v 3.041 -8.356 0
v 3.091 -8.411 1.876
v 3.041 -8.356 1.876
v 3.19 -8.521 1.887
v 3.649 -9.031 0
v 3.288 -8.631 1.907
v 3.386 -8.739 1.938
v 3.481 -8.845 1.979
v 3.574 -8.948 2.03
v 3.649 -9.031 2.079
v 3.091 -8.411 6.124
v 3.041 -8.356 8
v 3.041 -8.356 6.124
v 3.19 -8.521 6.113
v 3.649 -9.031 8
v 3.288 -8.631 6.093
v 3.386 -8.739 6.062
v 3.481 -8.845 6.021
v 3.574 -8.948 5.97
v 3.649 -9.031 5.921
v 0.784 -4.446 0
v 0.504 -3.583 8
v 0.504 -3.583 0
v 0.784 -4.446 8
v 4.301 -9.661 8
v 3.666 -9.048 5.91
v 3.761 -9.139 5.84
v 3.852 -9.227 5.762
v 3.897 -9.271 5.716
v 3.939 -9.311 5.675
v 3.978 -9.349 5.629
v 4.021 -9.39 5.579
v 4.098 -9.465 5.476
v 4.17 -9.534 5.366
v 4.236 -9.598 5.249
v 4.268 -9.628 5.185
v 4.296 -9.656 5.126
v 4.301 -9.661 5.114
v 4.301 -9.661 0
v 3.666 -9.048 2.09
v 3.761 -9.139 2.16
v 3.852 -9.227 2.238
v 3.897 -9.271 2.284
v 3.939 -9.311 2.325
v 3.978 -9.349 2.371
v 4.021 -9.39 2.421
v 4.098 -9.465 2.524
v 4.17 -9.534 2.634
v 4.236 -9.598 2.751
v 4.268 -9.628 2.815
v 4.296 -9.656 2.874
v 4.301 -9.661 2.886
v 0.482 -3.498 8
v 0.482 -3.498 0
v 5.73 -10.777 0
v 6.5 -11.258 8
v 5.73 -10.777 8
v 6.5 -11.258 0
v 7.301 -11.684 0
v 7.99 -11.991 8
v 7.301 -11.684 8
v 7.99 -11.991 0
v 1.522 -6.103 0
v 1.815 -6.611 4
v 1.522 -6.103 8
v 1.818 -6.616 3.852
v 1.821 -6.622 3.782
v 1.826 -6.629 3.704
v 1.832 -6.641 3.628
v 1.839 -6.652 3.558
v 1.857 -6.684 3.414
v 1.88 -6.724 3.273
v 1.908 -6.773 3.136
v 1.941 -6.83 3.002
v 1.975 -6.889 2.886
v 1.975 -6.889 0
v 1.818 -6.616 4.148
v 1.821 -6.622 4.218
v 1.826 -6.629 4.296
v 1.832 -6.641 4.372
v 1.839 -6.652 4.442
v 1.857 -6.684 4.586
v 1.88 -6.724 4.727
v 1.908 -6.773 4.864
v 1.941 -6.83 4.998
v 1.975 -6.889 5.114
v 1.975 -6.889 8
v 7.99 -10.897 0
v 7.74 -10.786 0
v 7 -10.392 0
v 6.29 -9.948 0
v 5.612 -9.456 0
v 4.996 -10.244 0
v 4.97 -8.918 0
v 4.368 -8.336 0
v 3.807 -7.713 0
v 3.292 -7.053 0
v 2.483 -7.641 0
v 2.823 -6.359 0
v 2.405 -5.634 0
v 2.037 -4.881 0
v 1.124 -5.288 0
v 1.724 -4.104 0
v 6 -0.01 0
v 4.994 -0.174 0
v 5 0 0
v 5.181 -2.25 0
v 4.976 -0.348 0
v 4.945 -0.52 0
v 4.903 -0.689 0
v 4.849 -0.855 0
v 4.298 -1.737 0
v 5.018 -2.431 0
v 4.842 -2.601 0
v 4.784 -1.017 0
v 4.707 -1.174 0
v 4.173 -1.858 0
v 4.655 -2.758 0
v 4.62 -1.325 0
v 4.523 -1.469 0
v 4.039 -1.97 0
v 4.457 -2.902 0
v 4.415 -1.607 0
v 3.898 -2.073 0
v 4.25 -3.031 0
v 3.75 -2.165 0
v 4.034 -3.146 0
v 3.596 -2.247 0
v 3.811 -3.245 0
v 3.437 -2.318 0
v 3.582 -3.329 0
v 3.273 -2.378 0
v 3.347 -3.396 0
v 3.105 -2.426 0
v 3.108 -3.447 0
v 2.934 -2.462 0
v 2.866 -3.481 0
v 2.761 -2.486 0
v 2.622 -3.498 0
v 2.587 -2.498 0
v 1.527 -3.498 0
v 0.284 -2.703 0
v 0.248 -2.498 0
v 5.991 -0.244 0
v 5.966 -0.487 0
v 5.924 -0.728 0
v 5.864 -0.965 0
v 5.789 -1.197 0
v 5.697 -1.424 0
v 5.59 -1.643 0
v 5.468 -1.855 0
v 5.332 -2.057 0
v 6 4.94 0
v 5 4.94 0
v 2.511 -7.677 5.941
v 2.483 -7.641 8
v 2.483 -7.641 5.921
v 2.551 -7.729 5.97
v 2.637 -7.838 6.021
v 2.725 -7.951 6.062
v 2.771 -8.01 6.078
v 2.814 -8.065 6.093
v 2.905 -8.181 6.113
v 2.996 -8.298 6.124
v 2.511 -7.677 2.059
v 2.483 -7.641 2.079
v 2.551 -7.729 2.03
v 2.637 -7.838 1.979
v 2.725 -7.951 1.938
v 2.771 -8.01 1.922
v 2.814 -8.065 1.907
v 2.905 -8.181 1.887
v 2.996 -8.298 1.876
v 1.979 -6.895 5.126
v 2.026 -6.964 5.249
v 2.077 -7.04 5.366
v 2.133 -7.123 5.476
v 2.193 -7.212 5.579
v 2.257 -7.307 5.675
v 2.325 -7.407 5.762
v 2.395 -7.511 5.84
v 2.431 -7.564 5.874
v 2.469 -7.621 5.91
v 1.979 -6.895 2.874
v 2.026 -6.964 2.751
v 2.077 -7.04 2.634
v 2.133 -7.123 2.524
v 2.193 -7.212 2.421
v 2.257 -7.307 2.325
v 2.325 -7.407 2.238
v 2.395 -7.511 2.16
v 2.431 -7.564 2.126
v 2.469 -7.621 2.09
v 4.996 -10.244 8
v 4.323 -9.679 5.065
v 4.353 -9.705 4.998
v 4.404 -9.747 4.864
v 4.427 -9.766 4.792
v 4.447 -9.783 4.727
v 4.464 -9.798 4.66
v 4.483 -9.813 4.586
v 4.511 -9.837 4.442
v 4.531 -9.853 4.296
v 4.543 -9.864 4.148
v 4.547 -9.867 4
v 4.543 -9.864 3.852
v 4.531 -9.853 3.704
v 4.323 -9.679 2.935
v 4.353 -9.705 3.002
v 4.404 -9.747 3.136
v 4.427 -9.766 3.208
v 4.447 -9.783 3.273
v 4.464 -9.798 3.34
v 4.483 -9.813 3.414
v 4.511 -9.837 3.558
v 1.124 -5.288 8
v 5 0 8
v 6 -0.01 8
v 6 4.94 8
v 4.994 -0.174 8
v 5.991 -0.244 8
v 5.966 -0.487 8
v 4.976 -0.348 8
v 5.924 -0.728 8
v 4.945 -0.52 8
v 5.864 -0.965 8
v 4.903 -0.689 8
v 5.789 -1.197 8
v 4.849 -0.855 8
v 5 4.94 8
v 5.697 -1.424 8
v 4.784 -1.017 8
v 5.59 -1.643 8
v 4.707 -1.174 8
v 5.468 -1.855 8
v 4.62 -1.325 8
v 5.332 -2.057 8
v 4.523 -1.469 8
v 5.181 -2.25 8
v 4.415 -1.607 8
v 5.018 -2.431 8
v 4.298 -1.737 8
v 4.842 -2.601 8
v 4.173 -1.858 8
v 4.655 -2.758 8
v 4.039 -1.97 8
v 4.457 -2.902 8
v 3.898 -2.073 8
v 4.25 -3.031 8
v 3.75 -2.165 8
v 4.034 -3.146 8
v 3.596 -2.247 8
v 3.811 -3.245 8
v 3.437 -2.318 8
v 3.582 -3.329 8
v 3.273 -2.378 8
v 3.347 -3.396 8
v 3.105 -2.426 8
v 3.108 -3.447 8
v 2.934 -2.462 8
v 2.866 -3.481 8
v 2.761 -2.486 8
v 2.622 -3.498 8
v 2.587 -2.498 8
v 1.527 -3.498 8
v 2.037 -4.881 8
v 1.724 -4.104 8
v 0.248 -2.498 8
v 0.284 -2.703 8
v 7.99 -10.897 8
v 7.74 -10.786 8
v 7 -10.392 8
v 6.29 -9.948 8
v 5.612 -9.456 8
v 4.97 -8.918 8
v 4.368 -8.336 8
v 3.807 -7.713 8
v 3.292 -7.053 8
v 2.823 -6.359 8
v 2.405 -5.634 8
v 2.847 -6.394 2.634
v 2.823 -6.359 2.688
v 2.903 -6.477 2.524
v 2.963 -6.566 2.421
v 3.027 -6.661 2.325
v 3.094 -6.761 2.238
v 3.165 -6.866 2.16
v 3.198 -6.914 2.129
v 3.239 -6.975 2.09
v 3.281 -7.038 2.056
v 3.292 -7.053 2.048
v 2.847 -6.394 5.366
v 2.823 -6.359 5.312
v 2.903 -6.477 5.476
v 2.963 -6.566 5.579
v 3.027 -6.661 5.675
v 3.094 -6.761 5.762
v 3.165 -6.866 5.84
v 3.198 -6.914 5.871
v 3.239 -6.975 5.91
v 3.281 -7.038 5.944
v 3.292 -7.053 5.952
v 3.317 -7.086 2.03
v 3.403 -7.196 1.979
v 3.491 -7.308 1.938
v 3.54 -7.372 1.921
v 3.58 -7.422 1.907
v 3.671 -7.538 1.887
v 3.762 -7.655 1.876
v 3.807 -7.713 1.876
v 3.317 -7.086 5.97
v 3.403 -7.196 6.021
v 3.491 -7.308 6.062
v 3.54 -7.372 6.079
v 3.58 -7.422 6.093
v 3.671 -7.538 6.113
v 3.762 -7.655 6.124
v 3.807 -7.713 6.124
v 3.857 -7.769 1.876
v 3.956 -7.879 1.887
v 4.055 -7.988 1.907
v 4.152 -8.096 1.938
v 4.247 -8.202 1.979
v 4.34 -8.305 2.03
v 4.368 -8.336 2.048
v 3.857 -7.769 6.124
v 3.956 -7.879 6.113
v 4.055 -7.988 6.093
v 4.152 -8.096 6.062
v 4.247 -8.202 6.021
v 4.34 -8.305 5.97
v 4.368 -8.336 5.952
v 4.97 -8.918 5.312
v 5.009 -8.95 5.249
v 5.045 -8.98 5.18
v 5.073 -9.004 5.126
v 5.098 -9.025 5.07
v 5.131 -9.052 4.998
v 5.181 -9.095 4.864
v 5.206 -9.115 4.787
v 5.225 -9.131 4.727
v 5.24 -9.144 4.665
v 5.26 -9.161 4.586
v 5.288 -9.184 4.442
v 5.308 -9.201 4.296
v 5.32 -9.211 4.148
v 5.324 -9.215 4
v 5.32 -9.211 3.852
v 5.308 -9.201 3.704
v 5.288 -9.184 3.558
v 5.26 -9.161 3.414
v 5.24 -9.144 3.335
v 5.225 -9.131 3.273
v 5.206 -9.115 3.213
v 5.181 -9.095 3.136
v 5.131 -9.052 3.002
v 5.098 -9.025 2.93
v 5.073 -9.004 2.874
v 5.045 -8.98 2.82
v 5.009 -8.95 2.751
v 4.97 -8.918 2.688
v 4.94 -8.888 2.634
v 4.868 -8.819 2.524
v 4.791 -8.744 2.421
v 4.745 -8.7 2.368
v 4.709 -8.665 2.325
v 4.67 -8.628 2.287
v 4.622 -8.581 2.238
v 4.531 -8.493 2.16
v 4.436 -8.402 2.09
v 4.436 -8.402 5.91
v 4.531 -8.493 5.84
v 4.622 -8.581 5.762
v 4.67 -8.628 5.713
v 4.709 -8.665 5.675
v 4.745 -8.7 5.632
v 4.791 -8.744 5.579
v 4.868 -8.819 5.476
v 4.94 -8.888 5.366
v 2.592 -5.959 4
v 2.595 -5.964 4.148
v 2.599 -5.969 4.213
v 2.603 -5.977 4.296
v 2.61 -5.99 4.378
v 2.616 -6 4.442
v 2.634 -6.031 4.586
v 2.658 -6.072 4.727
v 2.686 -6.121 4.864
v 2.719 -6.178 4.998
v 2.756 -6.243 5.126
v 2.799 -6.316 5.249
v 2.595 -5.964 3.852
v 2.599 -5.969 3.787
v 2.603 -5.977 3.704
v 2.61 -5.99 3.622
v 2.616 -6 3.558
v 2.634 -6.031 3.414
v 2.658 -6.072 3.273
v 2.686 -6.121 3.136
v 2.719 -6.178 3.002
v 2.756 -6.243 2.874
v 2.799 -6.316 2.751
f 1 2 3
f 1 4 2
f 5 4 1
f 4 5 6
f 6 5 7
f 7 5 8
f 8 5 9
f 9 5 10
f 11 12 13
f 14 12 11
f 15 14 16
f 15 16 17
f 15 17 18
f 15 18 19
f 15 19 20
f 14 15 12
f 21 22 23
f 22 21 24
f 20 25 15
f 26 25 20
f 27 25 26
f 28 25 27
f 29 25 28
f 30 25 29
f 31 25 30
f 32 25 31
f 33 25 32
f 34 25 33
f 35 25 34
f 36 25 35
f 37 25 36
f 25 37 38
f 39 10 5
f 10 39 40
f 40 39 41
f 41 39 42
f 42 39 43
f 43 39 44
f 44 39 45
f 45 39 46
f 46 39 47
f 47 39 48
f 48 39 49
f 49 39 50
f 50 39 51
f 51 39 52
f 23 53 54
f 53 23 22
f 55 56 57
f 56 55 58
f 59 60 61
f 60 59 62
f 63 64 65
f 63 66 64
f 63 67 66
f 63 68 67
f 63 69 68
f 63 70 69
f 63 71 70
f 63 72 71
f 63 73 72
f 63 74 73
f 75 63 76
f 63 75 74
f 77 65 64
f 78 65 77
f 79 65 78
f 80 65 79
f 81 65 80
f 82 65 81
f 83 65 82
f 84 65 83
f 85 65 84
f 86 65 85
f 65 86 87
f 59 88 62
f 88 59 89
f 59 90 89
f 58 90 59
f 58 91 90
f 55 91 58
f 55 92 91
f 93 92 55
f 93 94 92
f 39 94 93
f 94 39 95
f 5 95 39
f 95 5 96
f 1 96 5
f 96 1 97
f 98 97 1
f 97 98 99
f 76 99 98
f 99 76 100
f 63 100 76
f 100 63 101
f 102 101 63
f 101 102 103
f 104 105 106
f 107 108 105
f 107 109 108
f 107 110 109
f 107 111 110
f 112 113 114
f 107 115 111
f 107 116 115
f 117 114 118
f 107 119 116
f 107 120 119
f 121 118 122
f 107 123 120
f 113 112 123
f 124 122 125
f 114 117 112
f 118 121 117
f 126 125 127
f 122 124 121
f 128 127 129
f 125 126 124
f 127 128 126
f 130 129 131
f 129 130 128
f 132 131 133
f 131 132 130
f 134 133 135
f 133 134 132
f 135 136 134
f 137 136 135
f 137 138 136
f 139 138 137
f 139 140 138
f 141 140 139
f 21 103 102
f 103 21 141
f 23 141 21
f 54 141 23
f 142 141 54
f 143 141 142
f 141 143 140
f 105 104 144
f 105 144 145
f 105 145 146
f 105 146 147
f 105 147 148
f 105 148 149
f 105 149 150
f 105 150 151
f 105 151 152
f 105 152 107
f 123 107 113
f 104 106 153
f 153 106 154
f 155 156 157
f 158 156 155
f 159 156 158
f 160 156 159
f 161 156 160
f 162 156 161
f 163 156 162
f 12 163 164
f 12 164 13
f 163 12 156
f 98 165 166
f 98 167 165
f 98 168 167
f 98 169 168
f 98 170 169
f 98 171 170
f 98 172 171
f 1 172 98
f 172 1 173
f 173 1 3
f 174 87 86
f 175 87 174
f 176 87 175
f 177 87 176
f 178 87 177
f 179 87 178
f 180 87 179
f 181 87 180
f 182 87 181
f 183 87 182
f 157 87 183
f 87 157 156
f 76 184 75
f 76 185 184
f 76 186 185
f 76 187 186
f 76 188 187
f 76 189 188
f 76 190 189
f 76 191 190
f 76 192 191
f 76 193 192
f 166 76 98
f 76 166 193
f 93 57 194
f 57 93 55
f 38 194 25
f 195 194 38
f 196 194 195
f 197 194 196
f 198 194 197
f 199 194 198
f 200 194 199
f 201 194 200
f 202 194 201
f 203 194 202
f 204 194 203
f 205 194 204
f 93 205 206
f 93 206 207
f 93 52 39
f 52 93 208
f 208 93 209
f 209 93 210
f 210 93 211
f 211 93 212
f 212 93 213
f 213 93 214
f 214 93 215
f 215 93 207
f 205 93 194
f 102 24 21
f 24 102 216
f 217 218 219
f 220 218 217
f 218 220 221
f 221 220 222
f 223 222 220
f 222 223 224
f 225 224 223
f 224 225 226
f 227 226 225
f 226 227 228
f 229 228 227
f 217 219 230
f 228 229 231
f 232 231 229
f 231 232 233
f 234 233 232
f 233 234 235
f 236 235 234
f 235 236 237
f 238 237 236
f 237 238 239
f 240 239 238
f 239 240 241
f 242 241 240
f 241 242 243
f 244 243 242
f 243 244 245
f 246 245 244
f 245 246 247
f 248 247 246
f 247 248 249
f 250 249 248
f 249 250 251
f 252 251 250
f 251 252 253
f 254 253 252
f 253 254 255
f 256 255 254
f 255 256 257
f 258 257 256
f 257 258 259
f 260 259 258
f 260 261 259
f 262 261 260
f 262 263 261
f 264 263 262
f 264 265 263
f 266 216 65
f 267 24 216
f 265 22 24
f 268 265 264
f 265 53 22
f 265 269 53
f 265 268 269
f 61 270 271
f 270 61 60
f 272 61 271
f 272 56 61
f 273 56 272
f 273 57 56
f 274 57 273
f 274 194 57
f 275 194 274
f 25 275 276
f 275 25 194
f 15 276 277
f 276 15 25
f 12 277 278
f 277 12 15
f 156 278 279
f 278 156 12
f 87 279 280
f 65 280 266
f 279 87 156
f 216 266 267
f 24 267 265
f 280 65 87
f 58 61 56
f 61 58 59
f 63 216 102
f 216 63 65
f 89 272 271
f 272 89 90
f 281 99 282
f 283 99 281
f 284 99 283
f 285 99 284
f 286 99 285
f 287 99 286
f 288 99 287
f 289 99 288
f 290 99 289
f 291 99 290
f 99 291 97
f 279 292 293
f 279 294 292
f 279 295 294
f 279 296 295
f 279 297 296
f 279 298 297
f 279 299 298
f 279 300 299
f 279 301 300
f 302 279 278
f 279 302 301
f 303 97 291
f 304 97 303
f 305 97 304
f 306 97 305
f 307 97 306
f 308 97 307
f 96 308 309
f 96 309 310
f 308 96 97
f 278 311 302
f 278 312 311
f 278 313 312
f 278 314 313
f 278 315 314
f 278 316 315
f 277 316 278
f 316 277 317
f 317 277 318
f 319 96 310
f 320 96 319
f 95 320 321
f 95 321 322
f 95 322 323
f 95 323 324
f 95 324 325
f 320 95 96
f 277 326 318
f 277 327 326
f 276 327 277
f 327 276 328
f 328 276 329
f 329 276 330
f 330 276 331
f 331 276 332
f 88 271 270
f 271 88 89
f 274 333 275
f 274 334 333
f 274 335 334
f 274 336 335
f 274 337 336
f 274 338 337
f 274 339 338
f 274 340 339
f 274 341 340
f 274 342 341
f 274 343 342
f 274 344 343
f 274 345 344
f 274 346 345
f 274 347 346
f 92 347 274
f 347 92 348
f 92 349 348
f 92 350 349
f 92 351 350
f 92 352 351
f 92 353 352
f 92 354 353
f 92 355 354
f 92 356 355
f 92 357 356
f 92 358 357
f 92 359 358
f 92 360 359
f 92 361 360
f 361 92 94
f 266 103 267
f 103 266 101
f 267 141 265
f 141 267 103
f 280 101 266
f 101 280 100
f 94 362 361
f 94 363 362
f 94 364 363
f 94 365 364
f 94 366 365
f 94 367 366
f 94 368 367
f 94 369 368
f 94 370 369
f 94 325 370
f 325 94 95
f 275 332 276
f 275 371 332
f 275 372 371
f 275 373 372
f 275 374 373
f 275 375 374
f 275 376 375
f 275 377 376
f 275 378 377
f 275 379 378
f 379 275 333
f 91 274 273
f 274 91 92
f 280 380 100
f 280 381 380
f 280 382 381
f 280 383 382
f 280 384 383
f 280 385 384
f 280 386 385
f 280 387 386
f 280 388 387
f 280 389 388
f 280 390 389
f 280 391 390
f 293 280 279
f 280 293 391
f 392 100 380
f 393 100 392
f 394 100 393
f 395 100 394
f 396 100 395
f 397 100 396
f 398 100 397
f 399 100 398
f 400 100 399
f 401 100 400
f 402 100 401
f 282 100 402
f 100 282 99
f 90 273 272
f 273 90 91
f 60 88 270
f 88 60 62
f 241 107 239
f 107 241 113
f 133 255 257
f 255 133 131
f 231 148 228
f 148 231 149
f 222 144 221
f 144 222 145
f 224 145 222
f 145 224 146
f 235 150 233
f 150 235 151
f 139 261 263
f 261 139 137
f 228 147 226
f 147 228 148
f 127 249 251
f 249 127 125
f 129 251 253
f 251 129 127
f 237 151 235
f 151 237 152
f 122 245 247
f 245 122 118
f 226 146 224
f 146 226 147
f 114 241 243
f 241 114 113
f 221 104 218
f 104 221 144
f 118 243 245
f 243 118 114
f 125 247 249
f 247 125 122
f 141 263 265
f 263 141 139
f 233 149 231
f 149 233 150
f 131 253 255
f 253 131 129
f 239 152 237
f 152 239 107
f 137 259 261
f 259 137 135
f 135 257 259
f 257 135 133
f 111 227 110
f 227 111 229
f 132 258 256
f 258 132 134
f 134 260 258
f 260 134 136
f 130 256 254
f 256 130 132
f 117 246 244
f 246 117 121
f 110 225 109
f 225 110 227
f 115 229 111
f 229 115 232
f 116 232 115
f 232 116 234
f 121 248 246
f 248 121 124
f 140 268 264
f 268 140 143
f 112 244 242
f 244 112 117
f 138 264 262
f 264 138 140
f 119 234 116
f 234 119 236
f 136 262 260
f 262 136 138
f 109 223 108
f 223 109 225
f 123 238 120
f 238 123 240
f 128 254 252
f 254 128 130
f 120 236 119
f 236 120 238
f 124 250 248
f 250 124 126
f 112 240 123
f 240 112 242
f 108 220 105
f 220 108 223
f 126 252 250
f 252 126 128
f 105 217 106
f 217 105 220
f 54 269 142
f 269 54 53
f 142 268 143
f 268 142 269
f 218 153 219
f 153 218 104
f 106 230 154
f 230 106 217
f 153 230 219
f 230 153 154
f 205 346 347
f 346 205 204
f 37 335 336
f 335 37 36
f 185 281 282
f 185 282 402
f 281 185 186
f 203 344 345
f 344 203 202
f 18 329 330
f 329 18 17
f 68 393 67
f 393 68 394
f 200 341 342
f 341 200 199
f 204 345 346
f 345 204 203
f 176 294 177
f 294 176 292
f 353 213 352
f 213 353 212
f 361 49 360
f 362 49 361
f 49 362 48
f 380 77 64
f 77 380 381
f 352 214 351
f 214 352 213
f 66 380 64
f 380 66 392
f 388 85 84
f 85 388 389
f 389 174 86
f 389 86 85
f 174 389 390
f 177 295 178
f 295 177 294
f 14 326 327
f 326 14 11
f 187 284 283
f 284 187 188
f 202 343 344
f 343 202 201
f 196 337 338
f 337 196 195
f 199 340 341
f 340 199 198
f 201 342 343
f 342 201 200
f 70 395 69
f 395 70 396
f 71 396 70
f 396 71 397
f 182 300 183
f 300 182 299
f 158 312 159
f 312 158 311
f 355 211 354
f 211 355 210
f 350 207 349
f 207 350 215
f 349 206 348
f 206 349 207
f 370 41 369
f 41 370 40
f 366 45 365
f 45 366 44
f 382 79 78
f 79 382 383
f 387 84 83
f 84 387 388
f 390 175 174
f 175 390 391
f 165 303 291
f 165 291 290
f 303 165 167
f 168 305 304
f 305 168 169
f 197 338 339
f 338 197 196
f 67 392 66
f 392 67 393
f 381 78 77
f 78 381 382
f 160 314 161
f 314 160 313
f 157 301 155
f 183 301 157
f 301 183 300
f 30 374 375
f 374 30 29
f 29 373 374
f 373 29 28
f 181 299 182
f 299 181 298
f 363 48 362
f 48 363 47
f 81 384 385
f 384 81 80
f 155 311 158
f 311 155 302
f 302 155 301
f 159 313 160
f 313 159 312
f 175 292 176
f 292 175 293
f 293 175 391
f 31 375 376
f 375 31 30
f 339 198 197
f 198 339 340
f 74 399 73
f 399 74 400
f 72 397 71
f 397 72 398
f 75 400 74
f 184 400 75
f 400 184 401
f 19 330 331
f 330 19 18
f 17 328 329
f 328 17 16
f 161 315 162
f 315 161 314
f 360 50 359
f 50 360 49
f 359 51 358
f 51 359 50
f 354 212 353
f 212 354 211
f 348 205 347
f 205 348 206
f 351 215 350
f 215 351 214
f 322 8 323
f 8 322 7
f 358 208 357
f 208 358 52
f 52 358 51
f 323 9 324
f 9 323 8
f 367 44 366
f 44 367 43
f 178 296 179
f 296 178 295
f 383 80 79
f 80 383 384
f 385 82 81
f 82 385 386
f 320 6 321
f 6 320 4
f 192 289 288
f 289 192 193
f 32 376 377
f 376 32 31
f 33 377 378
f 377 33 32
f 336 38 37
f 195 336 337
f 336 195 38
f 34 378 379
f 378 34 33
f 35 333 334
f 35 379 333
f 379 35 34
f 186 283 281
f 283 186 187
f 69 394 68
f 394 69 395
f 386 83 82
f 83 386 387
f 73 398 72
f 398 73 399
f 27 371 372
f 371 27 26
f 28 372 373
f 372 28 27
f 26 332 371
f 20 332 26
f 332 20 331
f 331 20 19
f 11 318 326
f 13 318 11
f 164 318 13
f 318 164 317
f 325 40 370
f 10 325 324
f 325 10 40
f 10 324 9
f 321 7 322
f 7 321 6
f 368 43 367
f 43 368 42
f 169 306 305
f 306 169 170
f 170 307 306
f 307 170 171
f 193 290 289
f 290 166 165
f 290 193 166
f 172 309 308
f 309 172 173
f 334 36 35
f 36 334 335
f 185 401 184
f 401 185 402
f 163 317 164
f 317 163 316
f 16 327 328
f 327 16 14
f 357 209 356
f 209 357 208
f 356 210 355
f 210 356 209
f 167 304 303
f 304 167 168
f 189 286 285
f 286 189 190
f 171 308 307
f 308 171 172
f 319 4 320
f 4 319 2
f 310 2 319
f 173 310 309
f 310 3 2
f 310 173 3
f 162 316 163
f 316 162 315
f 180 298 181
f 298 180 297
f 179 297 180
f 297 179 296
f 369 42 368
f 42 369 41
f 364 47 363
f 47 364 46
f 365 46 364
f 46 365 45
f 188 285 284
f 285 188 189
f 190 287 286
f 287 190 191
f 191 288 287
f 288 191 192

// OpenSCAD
width=8;
diameter=13*2;
thickness=1;
gap=0.5;
length=25;
$fn=90;
cabled=5;
screwd=4.25;
springl=length-2*screwd;
depth=8;
treethickness=5;
treex=50;
treey=50;
treez=100;

module tree() {
  color([0.6,0.3,0.3]) translate([diameter/2,0,0]) difference() { 
    cube([treex,treey,treez],center=true);
    translate([0,0,-treez/2-1]) cylinder(h=treez*2,d=diameter);
    translate([diameter/2+depth,0,-1]) cube([treex,treey*2,treez*2],center=true);
  }
}

module clip() {
  difference() {
    union() {
      intersection() {
	translate([diameter/2,0,0]) {
	  difference() {
	    cylinder(h=width,d=diameter);
	    translate([0,0,-0.01]) cylinder(h=width+0.02,d=diameter-thickness*2);
	  }
	}

	translate([-0.01,-length/2,0]) cube([depth,length/2-cabled/2,width]);
      }
      intersection() {
	difference() {
	  hull() {
	    translate([cabled/2,0,0]) cylinder(h=width,d=cabled+thickness*2);
	    cylinder(h=width,d=cabled+thickness*2);
	  }
	  hull() {
	    translate([cabled/2,0,0]) translate([0,0,-0.01]) cylinder(h=width+0.02,d=cabled);
	    translate([0,0,-0.01]) cylinder(h=width+0.02,d=cabled);
	  }
	}
	translate([diameter/2,0,0]) cylinder(h=width,d=diameter);
	translate([0,-length/2,0]) cube([cabled*2,length/2,width]);
      }

      translate([cabled,-0.01,0]) cube([thickness,cabled*.99,width]);
    }
    translate([diameter/2,0,width/2]) rotate([90,0,-90+40]) cylinder(d=screwd,h=diameter+1);
  }
}

//tree();
clip();
